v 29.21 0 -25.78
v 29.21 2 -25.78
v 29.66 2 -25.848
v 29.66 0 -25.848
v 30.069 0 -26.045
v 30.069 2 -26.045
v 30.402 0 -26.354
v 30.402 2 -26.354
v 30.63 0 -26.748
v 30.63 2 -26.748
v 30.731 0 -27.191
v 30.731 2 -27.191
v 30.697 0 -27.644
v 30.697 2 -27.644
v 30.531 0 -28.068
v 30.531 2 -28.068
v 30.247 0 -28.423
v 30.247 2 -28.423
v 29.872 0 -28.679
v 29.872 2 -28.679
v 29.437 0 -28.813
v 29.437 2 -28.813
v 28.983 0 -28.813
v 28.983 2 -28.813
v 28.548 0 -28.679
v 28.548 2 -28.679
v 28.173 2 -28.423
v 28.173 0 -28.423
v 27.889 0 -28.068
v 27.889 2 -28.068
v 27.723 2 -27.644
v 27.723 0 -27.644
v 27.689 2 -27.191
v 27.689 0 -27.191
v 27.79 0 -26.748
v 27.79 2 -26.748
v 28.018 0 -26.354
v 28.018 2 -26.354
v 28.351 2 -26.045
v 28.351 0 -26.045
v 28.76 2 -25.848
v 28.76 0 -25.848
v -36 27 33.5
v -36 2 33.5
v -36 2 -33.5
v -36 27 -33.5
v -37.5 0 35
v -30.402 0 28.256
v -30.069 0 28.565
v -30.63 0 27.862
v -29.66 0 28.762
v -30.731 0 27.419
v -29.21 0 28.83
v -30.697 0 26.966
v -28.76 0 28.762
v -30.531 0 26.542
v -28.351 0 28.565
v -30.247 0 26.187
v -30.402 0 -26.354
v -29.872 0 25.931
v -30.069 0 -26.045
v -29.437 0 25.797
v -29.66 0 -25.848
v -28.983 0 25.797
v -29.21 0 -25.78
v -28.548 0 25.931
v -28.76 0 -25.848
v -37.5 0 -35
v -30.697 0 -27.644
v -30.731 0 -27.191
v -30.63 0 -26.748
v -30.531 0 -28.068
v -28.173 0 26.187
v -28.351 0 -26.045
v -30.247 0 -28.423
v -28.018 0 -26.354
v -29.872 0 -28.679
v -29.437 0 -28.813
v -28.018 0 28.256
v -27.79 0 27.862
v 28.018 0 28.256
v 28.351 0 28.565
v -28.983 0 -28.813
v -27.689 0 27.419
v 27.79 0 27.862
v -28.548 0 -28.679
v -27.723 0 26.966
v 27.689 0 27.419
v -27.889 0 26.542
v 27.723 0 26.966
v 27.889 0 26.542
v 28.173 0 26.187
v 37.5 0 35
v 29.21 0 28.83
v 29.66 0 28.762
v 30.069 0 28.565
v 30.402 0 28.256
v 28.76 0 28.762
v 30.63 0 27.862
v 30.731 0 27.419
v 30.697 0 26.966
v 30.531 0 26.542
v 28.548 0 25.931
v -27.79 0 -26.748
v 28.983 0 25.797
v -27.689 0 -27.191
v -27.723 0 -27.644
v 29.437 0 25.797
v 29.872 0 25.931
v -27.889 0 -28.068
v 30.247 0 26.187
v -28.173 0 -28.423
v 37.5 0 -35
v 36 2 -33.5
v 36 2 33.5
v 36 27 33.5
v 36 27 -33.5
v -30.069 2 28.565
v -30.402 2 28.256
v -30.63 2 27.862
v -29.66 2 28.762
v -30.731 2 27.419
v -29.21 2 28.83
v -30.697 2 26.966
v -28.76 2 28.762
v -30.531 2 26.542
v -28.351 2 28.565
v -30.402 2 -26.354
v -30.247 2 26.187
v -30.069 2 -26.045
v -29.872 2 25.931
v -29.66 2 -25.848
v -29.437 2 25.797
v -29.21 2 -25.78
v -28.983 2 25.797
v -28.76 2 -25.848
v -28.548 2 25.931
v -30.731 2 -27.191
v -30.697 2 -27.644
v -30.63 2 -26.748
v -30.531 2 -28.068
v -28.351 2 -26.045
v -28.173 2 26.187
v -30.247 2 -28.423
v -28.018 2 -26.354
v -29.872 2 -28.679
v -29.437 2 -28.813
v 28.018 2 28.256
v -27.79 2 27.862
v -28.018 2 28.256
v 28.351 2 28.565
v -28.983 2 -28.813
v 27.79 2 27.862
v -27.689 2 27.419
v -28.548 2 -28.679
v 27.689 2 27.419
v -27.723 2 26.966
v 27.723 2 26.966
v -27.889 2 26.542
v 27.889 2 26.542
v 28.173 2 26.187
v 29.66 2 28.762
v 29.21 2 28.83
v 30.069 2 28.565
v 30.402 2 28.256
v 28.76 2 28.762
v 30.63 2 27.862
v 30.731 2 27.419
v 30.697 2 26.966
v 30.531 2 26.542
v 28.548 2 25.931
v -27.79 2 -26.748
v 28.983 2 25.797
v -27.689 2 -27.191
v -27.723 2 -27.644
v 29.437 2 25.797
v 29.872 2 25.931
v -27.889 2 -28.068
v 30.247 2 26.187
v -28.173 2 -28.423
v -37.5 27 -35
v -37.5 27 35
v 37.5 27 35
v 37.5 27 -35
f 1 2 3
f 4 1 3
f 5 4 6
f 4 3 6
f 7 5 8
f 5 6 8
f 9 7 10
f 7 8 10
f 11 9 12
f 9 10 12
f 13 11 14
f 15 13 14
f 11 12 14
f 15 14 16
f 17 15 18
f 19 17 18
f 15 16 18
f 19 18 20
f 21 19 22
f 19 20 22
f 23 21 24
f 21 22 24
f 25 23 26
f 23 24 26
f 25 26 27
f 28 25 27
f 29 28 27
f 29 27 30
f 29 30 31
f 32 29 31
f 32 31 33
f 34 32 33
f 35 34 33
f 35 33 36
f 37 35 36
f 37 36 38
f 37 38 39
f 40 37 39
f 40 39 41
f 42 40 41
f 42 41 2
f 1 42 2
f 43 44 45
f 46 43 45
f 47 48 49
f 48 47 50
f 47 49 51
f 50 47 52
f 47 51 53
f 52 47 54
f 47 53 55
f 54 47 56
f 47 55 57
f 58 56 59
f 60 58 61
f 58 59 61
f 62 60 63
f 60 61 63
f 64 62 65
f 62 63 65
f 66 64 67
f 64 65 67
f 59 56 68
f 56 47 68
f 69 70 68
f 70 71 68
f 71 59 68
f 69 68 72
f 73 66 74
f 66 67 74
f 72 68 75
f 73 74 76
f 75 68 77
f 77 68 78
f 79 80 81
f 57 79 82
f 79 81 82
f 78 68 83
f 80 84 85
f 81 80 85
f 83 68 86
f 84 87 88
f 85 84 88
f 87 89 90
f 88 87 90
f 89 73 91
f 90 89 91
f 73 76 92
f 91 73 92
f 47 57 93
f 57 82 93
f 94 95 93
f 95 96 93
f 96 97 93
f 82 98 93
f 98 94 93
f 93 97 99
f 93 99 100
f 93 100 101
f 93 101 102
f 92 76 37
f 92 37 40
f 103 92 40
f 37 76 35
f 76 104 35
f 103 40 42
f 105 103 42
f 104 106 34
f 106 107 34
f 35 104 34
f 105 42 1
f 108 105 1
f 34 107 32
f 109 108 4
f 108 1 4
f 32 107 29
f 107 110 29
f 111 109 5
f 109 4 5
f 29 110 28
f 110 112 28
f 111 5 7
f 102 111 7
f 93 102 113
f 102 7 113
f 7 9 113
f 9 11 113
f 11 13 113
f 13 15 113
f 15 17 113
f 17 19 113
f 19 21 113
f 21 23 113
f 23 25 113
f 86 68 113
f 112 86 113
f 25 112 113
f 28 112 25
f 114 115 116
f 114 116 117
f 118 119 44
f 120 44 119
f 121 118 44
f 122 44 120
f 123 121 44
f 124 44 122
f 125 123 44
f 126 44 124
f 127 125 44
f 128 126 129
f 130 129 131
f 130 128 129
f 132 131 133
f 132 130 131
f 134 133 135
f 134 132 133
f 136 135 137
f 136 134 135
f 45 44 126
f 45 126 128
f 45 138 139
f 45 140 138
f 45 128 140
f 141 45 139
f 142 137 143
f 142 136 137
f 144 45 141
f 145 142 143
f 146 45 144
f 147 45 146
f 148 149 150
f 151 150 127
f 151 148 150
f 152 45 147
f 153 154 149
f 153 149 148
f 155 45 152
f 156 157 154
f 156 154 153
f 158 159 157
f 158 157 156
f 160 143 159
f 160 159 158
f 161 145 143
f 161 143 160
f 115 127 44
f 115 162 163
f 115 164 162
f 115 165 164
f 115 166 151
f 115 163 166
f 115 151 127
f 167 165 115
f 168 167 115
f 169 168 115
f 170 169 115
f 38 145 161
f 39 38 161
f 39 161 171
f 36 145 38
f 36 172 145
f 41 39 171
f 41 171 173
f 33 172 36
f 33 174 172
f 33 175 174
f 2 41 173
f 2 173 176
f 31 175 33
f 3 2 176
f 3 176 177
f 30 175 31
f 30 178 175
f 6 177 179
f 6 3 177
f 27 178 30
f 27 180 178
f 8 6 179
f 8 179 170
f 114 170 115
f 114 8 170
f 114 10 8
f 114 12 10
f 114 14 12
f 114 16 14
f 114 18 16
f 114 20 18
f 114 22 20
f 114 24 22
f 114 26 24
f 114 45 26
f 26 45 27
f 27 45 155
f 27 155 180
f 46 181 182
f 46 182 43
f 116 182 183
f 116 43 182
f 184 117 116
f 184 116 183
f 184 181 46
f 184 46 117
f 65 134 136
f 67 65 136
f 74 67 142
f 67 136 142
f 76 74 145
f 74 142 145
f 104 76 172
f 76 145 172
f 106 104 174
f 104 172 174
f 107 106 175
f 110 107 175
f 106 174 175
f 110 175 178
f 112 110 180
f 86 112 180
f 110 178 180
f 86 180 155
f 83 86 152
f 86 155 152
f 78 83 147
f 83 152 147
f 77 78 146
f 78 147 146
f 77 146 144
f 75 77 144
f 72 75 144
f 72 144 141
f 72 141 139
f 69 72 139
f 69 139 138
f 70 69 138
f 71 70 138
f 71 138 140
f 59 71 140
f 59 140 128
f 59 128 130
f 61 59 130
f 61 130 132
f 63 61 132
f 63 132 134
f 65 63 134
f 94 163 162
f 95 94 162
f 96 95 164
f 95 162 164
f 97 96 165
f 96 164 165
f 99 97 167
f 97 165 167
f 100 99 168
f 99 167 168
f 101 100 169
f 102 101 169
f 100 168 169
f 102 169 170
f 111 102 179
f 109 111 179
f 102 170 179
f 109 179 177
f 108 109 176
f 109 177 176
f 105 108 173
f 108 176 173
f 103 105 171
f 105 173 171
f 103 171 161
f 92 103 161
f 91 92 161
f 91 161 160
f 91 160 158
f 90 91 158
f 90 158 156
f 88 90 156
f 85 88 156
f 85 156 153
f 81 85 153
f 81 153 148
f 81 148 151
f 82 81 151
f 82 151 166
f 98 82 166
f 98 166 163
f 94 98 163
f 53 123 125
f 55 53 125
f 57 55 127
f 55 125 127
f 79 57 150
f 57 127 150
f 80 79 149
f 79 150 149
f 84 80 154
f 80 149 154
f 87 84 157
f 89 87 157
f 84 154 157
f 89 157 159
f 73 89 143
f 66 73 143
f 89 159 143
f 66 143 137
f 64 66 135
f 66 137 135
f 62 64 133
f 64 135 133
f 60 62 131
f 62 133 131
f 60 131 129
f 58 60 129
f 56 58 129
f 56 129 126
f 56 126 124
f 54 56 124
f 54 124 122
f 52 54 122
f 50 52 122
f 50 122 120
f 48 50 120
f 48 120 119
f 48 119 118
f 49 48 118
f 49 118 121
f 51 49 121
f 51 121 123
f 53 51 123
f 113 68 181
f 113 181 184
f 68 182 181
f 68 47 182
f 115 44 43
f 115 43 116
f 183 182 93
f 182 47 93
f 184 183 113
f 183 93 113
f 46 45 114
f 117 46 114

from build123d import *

# Parameters (mm, degrees)
CROQUIS1_W              = 75
CROQUIS1_H              = 70
SALIENTE_EXTRUIR1_DEPTH = 2
CROQUIS2_W              = 75
CROQUIS2_H              = 70
CROQUIS2_W_2            = 72
CROQUIS2_H_2            = 67
SALIENTE_EXTRUIR2_DEPTH = 25
CROQUIS3_R              = 1.525
CORTAR_EXTRUIR1_DEPTH   = 10


with BuildPart() as part:
    # Croquis1 → Saliente-Extruir1 (new body)
    with BuildSketch(Plane(origin=(0, 0, 0), x_dir=(1, 0, 0), z_dir=(0, 1, 0))):
        Rectangle(CROQUIS1_W, CROQUIS1_H)
    extrude(amount=SALIENTE_EXTRUIR1_DEPTH)

    # Croquis2 → Saliente-Extruir2 (add)
    with BuildSketch(Plane(origin=(0, 2, 0), x_dir=(1, 0, 0), z_dir=(0, 1, 0))):
        Rectangle(CROQUIS2_W, CROQUIS2_H)
        Rectangle(CROQUIS2_W_2, CROQUIS2_H_2, mode=Mode.SUBTRACT)
    extrude(amount=SALIENTE_EXTRUIR2_DEPTH)

    # Croquis3 → Cortar-Extruir1 (cut)
    with BuildSketch(Plane(origin=(0, 2, 0), x_dir=(1, 0, 0), z_dir=(0, 1, 0))):
        with Locations(Location((-29.21, 27.305, 0), (0, 0, 270))):
            Circle(CROQUIS3_R)
        with Locations(Location((-29.21, -27.305, 0), (0, 0, 270))):
            Circle(CROQUIS3_R)
        with Locations(Location((29.21, 27.305, 0), (0, 0, 270))):
            Circle(CROQUIS3_R)
        with Locations(Location((29.21, -27.3049805, 0), (0, 0, 270))):
            Circle(CROQUIS3_R)
    extrude(amount=-CORTAR_EXTRUIR1_DEPTH, mode=Mode.SUBTRACT)


solid = part.part
